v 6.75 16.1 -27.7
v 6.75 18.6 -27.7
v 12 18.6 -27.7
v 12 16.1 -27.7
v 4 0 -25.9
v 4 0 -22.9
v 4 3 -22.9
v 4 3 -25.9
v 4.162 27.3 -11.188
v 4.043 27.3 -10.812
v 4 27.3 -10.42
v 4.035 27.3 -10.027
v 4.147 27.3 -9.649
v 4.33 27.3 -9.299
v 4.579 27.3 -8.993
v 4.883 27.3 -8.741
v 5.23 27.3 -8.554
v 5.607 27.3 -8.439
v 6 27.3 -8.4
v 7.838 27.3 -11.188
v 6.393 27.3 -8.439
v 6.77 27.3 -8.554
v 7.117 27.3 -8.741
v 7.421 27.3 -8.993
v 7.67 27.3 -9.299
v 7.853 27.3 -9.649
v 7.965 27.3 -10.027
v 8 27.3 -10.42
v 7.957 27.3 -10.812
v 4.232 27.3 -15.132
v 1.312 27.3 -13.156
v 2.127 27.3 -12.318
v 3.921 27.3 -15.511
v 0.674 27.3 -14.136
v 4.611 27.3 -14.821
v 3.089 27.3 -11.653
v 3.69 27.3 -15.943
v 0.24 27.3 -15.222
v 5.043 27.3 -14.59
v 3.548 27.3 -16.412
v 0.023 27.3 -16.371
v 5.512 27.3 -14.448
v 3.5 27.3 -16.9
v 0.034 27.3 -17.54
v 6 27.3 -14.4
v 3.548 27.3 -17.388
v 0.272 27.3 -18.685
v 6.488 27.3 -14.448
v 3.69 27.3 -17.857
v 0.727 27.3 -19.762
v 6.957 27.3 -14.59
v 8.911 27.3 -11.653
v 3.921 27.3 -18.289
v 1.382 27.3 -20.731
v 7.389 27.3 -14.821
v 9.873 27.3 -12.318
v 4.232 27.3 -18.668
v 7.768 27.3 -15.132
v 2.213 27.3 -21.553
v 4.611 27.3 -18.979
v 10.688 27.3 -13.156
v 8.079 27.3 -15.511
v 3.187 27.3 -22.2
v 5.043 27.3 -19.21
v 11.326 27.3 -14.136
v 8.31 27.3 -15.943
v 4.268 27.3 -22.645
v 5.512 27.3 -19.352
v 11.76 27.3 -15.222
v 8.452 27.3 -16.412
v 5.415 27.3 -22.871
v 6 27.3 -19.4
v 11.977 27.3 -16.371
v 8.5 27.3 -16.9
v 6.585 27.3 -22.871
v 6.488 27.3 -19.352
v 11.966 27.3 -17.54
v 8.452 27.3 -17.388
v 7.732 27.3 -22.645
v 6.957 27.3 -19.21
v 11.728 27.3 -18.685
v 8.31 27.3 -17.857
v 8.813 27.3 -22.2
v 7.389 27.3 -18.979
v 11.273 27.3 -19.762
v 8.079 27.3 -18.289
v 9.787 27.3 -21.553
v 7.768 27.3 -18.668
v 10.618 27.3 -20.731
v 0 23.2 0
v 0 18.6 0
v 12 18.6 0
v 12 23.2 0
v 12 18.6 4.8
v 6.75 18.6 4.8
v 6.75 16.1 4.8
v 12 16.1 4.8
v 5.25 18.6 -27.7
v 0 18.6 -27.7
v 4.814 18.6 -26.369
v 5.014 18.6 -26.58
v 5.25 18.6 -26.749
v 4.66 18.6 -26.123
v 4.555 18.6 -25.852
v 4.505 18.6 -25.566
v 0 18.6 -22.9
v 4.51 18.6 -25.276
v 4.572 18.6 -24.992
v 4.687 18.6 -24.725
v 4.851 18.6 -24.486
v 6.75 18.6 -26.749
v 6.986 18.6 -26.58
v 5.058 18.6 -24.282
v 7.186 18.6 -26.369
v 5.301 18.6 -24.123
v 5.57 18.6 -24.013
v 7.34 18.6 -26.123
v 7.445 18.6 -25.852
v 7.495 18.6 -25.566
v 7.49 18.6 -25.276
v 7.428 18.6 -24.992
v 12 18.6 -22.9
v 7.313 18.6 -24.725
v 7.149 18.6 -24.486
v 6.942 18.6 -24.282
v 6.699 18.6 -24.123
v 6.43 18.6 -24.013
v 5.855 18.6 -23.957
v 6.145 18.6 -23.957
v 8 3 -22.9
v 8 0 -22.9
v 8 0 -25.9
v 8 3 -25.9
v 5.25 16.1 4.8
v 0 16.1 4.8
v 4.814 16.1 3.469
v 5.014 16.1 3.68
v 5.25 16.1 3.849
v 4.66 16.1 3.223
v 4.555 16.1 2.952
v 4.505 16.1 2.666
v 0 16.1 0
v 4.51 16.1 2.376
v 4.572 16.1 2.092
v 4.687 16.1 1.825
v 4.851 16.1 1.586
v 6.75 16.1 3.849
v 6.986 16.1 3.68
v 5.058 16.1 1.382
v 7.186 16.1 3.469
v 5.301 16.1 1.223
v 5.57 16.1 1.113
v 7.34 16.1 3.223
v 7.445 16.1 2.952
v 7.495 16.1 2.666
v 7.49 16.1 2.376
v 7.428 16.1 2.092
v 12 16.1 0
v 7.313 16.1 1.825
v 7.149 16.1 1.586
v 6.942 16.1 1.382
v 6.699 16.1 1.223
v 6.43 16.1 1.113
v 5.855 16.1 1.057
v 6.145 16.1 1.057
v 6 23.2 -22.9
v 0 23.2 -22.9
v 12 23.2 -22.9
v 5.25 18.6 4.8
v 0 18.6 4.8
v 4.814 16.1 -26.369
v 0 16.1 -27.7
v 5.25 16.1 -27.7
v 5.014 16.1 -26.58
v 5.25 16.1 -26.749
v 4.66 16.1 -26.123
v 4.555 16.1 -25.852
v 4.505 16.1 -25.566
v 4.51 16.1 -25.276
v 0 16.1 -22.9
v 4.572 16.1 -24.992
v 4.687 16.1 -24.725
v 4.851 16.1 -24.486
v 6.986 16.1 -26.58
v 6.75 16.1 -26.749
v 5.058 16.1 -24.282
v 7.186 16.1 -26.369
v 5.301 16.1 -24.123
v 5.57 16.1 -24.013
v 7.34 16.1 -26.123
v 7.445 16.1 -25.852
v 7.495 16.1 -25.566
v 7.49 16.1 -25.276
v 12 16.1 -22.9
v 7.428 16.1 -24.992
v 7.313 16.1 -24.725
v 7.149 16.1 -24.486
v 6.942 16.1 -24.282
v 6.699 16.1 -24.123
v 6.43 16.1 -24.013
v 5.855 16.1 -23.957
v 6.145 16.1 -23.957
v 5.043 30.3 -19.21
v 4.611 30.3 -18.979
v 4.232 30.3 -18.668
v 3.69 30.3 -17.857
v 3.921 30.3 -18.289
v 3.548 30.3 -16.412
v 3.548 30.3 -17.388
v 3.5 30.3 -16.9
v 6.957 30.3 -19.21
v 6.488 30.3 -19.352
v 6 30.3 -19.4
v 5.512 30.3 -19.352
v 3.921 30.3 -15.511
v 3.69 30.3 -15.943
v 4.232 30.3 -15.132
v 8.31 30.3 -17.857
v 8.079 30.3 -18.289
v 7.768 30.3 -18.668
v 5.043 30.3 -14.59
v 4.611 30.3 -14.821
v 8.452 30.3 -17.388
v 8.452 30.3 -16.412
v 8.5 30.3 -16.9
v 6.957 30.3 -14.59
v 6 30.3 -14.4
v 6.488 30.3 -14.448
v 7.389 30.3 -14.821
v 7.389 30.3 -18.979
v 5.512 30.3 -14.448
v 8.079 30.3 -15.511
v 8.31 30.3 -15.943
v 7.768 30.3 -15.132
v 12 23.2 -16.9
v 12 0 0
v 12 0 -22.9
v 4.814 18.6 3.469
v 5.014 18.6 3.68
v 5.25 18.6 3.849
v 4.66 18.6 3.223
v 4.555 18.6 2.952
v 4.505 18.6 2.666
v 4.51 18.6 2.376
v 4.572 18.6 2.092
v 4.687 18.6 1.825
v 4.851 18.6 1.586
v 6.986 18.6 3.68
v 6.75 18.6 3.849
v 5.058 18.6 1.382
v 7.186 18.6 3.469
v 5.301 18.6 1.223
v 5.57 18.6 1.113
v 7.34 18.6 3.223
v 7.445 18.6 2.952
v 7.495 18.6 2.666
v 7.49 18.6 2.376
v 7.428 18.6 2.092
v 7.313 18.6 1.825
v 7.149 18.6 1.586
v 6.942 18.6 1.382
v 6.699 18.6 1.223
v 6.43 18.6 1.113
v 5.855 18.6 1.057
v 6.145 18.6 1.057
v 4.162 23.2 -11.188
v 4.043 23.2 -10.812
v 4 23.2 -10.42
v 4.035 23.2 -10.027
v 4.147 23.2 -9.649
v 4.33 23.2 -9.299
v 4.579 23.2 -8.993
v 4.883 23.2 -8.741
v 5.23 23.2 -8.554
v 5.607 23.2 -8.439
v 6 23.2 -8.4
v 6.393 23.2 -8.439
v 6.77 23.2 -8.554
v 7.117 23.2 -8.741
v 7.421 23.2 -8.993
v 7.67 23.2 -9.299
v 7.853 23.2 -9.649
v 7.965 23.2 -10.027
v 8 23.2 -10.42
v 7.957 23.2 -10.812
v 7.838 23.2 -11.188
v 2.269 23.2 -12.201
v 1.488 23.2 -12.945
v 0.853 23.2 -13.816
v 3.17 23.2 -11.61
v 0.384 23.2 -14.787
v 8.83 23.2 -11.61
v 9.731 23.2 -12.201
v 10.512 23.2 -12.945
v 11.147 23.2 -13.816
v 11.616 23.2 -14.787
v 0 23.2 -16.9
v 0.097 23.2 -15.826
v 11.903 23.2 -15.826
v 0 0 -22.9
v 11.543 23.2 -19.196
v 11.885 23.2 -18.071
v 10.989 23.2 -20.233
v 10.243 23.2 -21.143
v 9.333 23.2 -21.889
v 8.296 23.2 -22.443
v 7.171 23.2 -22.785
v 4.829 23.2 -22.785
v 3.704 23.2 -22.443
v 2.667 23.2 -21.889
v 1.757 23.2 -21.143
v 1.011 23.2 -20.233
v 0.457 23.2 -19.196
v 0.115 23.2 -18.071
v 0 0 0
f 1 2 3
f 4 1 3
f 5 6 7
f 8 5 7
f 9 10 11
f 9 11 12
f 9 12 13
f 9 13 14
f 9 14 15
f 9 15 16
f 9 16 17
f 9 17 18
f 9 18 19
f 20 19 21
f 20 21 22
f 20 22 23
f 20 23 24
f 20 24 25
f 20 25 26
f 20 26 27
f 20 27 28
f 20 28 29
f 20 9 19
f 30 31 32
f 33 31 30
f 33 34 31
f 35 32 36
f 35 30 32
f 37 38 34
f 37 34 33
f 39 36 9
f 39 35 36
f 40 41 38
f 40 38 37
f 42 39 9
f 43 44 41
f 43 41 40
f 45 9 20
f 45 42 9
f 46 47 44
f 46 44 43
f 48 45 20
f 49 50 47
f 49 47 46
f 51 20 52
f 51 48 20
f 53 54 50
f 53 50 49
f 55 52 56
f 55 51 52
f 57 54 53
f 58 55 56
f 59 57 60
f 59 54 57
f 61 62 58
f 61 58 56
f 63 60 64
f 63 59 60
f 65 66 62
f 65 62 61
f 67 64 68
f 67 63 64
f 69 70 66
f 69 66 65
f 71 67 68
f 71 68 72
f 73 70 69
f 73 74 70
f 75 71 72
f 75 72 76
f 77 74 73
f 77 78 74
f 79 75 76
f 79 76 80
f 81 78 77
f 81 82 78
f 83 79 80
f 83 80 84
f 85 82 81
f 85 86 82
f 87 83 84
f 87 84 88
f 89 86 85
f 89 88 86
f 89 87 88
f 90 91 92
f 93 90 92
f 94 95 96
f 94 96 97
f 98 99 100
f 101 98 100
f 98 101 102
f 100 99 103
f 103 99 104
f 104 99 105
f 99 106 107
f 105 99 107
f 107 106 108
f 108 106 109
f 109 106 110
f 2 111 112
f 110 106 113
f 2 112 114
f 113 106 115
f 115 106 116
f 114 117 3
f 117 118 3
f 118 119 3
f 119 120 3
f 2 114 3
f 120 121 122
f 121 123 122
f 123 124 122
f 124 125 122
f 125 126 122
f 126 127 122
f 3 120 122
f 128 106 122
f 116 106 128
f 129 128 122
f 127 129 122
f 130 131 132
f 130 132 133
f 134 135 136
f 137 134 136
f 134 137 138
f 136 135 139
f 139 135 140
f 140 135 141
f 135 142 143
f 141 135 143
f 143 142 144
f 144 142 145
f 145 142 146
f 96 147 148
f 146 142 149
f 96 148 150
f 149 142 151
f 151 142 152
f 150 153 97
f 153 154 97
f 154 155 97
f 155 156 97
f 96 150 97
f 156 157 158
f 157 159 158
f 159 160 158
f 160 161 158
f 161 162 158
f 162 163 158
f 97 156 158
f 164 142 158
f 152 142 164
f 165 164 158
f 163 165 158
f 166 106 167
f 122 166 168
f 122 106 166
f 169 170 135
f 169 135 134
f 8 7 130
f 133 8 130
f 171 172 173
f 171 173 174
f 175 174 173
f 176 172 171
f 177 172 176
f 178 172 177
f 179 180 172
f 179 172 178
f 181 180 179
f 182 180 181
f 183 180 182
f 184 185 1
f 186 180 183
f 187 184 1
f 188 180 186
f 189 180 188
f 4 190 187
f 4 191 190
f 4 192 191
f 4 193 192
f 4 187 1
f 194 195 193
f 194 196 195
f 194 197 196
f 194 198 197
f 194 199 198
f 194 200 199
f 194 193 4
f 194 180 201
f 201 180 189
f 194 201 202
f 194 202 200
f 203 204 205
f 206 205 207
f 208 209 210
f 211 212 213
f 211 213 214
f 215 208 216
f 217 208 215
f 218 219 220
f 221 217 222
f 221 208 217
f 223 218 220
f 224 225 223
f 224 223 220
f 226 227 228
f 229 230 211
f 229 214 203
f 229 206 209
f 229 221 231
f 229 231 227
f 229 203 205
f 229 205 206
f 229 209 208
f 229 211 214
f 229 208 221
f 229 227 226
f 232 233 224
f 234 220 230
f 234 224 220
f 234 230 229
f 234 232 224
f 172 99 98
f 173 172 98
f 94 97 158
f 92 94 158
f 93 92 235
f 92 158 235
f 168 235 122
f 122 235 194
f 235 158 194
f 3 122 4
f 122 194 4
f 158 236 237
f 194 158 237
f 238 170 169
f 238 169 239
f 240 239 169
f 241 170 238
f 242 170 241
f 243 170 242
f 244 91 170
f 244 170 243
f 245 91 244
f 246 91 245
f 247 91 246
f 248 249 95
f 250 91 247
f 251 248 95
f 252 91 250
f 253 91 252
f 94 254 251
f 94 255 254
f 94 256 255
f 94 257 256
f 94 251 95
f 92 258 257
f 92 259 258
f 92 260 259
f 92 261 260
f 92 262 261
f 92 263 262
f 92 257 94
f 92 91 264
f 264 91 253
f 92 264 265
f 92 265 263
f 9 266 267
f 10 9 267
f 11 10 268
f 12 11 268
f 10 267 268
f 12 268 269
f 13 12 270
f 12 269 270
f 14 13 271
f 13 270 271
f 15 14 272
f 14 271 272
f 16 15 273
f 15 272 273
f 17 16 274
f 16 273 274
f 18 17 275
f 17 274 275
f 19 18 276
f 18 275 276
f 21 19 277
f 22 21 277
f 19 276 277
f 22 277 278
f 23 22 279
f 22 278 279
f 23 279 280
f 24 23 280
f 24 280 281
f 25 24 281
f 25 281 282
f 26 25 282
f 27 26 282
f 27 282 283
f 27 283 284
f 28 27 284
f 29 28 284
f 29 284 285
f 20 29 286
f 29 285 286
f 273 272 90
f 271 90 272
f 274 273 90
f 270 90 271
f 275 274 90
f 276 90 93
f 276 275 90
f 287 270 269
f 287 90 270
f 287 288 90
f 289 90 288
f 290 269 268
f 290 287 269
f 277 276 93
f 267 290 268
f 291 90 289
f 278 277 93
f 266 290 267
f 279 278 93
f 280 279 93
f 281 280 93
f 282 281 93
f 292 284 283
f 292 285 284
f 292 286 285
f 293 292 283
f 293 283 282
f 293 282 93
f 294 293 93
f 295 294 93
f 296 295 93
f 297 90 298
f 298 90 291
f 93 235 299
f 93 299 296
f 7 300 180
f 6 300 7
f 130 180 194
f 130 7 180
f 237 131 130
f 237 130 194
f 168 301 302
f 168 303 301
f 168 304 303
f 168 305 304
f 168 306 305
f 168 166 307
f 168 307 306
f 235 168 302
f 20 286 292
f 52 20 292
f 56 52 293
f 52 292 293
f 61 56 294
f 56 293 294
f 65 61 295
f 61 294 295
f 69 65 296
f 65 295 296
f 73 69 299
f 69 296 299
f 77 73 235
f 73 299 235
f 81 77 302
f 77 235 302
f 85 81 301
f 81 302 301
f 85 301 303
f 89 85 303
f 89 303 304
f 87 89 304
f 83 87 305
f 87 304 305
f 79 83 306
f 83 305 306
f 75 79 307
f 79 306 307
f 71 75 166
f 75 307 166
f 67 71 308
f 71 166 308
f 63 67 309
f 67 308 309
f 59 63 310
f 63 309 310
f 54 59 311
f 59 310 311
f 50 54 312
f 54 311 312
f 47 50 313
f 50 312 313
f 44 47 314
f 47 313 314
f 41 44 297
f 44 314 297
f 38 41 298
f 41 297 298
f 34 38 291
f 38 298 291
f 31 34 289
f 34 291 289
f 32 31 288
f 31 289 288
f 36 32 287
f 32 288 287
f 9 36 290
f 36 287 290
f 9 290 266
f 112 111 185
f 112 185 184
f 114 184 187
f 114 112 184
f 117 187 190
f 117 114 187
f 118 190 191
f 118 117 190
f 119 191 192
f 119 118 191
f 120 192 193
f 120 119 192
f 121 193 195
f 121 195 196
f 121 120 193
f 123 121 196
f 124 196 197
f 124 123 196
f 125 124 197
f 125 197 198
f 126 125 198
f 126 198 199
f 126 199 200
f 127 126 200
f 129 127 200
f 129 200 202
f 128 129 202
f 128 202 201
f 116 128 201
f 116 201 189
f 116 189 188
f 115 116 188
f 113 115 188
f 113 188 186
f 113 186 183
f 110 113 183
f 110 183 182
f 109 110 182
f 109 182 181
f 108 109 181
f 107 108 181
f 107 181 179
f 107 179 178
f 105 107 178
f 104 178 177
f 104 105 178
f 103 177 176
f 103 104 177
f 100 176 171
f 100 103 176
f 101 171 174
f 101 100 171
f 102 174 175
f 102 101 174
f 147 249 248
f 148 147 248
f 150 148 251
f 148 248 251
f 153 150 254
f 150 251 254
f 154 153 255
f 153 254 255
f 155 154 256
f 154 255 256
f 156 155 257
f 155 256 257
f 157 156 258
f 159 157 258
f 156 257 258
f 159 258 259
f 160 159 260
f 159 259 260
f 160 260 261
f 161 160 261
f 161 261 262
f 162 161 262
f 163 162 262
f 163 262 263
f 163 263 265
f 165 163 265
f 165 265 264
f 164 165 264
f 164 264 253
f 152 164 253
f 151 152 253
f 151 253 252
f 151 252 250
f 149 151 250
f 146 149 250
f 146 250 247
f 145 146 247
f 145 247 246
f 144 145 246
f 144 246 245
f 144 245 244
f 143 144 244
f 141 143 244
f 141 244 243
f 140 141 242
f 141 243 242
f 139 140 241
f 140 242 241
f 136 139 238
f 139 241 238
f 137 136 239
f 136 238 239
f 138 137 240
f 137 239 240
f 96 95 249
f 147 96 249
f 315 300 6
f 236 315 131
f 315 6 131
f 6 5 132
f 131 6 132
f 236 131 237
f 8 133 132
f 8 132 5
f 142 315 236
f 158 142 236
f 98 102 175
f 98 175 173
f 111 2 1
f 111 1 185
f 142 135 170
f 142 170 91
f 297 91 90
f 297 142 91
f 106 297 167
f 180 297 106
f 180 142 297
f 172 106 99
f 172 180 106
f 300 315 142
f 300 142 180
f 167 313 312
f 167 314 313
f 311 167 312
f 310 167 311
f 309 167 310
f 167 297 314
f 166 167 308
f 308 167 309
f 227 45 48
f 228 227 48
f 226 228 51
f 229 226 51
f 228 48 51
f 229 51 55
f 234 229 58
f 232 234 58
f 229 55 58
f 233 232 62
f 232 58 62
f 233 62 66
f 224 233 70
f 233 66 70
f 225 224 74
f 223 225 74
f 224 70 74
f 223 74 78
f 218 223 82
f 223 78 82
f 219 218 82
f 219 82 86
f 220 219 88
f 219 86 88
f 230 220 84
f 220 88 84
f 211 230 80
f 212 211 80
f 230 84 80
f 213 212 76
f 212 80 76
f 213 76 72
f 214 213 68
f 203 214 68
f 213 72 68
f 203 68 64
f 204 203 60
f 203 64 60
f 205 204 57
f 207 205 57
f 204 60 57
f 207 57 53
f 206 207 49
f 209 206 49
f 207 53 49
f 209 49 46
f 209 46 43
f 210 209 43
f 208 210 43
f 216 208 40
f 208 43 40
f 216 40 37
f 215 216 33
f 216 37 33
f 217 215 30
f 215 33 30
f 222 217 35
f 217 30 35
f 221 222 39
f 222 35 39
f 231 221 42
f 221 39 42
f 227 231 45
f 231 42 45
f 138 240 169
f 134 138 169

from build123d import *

# Parameters (mm, degrees)
SKETCH_1_W          = 12
SKETCH_1_H          = 22.9
EXTRUDE_1_DEPTH     = 23.2
SKETCH_2_R          = 6
SKETCH_2_R_2        = 2
EXTRUDE_2_DEPTH     = 4.1
SKETCH_3_R          = 2.5
EXTRUDE_3_DEPTH     = 3
SKETCH_4_W          = 12
SKETCH_4_H          = 2.5
EXTRUDE_4_DEPTH     = 4.8
CUT_EXTRUDE_1_REACH = 33.849
SKETCH_6_W          = 2
SKETCH_6_H          = 3
EXTRUDE_5_DEPTH     = 3


with BuildPart() as part:
    # 草图1 → 凸台-拉伸1 (new body)
    with BuildSketch(Plane(origin=(0, 0, 0), x_dir=(1, 0, 0), z_dir=(0, 1, 0))):
        with Locations((6, 11.45)):
            Rectangle(SKETCH_1_W, SKETCH_1_H)
    extrude(amount=EXTRUDE_1_DEPTH)

    # 草图2 → 凸台-拉伸2 (add)
    with BuildSketch(Plane(origin=(0, 23.2, 0), x_dir=(1, 0, 0), z_dir=(0, 1, 0))):
        with Locations((6, 16.9)):
            Circle(SKETCH_2_R)
        with Locations((6, 10.4)):
            Circle(SKETCH_2_R_2)
    extrude(amount=EXTRUDE_2_DEPTH)

    # 草图3 → 凸台-拉伸3 (add)
    with BuildSketch(Plane(origin=(0, 27.3, 0), x_dir=(1, 0, 0), z_dir=(0, 1, 0))):
        with Locations(Location((6, 16.9, 0), (0, 0, 270))):
            Circle(SKETCH_3_R)
    extrude(amount=EXTRUDE_3_DEPTH)

    # 草图4 → 凸台-拉伸4 (add)
    with BuildSketch(Plane.XY):
        with Locations((6, 17.35)):
            Rectangle(SKETCH_4_W, SKETCH_4_H)
    extrude_4 = extrude(amount=EXTRUDE_4_DEPTH)

    # 草图5 → 切除-拉伸1 (cut, up to next)
    with BuildSketch(Plane(origin=(0, 18.6, 0), x_dir=(1, 0, 0), z_dir=(0, 1, 0)), mode=Mode.PRIVATE) as cut_extrude_1_sk1:
        with BuildLine():
            Line((5.25, -4.8), (6.75, -4.8))
            Line((6.75, -4.8), (6.75, -3.849038106))
            ThreePointArc((6.75, -3.849038106), (6, -1.05), (5.25, -3.849038106))
            Line((5.25, -3.849038106), (5.25, -4.8))
        make_face()
    cut_extrude_1_tool1 = extrude(cut_extrude_1_sk1.sketch, amount=-CUT_EXTRUDE_1_REACH, mode=Mode.PRIVATE) & part.part
    cut_extrude_1 = cut_extrude_1_tool1.solids().sort_by_distance((6, 18.6, 2.821372))[0]
    add(cut_extrude_1, mode=Mode.SUBTRACT)

    # 镜向1: 凸台-拉伸4, 切除-拉伸1 across plane
    add(extrude_4.mirror(Plane.XY.offset(-11.45)))
    add(cut_extrude_1.mirror(Plane.XY.offset(-11.45)), mode=Mode.SUBTRACT)

    # 草图6 → 凸台-拉伸5 (add)
    with BuildSketch(Plane(origin=(0, 0, -22.9), x_dir=(-1, 0, 0), z_dir=(0, 0, -1))):
        with Locations((-7, 1.5)):
            Rectangle(SKETCH_6_W, SKETCH_6_H)
        with Locations((-5, 1.5)):
            Rectangle(SKETCH_6_W, SKETCH_6_H)
    extrude(amount=EXTRUDE_5_DEPTH)


solid = part.part
